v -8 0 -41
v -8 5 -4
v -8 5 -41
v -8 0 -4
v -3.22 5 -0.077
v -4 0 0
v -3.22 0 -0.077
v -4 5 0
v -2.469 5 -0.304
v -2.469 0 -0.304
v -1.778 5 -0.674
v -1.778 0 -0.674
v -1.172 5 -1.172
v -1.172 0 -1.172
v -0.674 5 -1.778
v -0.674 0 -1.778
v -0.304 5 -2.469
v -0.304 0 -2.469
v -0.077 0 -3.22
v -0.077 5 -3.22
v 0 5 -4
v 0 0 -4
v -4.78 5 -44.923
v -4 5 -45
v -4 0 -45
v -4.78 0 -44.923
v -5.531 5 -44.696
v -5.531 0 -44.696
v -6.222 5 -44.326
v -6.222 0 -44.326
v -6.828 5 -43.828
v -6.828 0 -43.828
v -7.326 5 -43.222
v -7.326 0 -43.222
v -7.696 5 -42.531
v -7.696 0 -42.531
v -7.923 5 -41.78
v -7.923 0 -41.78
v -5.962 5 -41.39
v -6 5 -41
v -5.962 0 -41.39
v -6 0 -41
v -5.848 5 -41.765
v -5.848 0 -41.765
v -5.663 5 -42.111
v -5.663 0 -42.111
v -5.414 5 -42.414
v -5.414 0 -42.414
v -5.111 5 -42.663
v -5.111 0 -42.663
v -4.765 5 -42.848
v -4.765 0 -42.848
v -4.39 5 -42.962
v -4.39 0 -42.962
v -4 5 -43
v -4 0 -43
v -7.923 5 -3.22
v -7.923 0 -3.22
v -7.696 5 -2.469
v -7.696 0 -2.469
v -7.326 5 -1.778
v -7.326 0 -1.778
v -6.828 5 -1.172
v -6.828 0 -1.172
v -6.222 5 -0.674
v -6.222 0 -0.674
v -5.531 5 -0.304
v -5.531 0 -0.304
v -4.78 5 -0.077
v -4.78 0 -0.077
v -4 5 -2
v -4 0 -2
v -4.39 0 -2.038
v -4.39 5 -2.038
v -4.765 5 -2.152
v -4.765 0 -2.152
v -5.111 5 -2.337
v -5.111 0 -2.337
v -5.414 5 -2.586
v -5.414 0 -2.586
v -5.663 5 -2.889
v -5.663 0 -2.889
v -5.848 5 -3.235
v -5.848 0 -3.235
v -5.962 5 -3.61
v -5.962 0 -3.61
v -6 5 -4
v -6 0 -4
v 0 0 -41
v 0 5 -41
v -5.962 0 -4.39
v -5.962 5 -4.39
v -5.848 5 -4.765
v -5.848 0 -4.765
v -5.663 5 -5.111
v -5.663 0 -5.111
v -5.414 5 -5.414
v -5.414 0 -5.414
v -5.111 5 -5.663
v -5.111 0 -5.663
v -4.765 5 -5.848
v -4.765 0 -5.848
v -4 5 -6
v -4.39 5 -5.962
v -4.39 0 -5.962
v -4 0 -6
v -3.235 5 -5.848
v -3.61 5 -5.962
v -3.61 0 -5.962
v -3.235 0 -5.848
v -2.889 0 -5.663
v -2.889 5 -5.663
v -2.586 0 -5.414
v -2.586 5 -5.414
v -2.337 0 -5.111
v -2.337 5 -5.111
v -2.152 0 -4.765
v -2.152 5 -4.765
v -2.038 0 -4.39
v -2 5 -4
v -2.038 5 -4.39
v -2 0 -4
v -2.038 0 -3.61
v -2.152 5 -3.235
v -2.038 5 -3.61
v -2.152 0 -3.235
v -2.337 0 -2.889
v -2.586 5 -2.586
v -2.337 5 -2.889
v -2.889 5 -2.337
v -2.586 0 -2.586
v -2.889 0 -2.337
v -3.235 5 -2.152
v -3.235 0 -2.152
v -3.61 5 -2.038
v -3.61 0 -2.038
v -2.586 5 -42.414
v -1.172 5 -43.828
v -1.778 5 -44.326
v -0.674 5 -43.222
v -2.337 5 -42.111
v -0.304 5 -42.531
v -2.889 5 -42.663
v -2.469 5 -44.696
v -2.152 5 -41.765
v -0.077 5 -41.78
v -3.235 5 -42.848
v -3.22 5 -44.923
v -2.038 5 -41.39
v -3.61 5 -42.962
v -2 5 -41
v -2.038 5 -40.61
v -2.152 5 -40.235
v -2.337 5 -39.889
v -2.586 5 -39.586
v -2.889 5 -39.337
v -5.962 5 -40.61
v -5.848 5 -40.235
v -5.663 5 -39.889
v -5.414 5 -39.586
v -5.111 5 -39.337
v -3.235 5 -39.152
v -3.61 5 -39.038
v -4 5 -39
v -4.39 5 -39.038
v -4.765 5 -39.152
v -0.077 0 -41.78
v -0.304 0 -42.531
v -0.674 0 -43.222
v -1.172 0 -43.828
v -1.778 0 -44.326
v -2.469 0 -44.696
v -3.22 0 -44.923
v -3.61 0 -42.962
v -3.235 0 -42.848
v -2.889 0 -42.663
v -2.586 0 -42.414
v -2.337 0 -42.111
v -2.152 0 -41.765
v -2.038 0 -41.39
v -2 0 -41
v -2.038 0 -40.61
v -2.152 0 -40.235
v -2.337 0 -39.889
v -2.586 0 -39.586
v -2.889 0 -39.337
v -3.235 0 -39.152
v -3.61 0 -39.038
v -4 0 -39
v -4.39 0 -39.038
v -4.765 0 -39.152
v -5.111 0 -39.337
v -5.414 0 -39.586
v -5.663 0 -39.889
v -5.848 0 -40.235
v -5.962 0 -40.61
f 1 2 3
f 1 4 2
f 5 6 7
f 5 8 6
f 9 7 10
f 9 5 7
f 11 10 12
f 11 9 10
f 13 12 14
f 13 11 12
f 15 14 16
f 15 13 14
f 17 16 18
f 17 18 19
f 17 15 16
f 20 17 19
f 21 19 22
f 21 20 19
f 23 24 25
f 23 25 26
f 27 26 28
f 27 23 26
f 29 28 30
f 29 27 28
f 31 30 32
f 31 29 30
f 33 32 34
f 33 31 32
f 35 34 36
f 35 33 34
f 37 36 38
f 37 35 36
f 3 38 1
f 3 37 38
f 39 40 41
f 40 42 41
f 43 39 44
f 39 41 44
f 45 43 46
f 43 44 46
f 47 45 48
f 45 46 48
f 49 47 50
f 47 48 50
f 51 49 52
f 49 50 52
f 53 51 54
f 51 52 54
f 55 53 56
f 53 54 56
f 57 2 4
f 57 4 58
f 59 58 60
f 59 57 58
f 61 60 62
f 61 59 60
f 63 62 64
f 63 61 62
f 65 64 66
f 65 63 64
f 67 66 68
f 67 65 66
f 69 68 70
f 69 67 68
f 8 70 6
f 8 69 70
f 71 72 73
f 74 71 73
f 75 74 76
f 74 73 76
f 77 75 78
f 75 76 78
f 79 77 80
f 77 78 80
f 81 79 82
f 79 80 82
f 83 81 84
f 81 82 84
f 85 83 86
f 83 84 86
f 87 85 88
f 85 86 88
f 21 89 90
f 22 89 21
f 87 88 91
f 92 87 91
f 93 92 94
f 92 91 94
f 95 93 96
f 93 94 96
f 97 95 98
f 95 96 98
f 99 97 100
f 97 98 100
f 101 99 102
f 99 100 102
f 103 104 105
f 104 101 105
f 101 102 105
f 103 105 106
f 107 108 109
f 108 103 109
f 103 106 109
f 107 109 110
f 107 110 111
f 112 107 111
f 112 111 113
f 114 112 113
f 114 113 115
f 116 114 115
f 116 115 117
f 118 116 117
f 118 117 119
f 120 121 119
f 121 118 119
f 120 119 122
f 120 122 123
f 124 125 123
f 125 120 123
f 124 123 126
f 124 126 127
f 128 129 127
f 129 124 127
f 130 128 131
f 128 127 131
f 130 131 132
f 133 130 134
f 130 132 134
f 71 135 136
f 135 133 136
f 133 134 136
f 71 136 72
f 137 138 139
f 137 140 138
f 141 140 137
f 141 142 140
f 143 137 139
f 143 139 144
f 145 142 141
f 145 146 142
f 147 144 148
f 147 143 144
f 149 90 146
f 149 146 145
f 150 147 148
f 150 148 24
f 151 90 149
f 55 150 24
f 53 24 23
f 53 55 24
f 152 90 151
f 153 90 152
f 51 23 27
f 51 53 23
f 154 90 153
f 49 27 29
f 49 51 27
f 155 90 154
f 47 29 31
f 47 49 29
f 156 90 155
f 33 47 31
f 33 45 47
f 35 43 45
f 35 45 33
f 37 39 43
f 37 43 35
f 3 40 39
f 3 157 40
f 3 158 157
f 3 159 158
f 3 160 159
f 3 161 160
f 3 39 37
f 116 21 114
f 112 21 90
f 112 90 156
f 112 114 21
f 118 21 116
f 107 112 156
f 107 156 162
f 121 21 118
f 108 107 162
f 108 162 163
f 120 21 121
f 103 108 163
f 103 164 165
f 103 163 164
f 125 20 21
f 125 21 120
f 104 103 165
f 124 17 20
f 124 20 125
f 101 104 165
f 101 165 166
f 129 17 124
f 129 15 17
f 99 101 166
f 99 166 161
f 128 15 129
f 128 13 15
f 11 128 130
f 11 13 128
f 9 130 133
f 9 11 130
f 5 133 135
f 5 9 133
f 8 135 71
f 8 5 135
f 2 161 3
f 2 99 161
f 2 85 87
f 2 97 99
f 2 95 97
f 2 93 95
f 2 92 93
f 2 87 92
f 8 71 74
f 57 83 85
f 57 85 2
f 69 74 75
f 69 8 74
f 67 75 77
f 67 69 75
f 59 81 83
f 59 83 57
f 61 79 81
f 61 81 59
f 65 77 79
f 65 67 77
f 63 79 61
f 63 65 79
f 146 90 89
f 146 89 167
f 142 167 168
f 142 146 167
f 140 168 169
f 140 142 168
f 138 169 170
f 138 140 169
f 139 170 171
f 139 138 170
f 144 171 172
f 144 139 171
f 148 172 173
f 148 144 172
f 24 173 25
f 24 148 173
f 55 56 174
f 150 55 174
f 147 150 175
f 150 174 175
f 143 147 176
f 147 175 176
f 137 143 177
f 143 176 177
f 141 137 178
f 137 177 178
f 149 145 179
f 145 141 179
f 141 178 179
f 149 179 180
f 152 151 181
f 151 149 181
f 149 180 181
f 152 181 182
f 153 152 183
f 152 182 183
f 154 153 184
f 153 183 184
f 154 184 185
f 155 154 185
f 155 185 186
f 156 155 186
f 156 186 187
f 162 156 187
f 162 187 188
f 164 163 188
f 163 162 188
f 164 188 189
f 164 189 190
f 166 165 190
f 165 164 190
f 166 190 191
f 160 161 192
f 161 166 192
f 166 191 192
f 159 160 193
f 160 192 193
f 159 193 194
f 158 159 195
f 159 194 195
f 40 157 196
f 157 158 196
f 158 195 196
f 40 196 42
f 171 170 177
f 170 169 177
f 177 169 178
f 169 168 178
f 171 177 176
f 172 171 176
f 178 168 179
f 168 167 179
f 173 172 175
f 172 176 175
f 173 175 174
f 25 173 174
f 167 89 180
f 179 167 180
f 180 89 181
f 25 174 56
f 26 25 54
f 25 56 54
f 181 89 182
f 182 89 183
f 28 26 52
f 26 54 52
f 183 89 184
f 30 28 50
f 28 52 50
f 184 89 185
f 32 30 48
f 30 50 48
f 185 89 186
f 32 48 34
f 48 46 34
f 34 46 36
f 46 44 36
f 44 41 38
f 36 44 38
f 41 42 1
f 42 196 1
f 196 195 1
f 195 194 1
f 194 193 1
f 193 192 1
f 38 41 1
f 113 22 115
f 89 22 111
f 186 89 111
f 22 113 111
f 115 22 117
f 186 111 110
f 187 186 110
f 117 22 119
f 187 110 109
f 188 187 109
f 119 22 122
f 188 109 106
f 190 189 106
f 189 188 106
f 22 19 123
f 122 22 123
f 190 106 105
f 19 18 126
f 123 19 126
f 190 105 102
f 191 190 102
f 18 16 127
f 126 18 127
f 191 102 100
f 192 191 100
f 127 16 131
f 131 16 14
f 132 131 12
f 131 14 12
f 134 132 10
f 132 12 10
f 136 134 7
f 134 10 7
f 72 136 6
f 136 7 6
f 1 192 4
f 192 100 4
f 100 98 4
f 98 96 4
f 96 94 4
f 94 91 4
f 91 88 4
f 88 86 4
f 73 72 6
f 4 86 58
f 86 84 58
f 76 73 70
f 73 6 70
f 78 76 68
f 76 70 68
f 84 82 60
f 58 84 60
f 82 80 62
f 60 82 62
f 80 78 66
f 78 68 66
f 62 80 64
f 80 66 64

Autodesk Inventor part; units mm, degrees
ref_plane "YZ Plane" through (0, 0, 0) normal (1, 0, 0) x (0, 1, 0)
ref_plane "XZ Plane" through (0, 0, 0) normal (0, 1, 0) x (-1, 0, 0)
ref_plane "XY Plane" through (0, 0, 0) normal (0, 0, 1) x (1, 0, 0)
sketch "Sketch1" plane through (0, 0, 0) normal (0, 1, 0) x (-1, 0, 0)
  line L0 (0, 0) -> (8, 0)
  line L1 (8, 0) -> (8, -45)
  line L2 (8, -45) -> (0, -45)
  line L3 (0, -45) -> (0, 0)
  line L4 (8, 0) -> (4, 0)
  line L5 (4, 0) -> (4, -4)
  circle A0 centre (4, -4) radius 2
  line L6 (8, -45) -> (4, -45)
  line L7 (4, -45) -> (4, -41)
  circle A1 centre (4, -41) radius 2
  dimension "d0" = 8
  dimension "d1" = 45
  dimension "d2" = 4
  dimension "d3" = 4
  dimension "d4" = 4
  dimension "d5" = 4
  dimension "d6" = 4
  dimension "d7" = 4
extrude "Extrusion1" add sketch "Sketch1" along normal blind 5
fillet "Fillet1" radius 4 4 edges at (0, 2.5, 0) (-8, 2.5, 0) (-8, 2.5, -45) (0, 2.5, -45)
properties part number "Bar"
